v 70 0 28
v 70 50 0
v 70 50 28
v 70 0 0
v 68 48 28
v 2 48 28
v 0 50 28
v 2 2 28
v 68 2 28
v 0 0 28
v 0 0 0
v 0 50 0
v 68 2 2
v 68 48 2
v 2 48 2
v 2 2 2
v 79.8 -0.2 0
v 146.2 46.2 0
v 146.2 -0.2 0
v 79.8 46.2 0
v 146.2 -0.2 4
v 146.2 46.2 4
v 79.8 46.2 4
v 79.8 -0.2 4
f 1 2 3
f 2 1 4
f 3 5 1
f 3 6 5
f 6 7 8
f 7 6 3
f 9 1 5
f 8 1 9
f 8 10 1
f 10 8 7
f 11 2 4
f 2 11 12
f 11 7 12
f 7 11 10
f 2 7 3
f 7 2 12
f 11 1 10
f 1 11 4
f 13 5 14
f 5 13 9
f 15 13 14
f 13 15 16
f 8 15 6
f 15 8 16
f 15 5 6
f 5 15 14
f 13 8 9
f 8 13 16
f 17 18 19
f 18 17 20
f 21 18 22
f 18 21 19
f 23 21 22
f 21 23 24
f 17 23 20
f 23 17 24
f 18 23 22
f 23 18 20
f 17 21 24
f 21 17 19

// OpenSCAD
// Two-part enclosure for a small electronics board (e.g. Arduino-based temperature logger)
// Print orientation: box stands on its floor, lid is printed upside down on the +X side

// ---------------- Parameters ----------------
box_x      = 70;    // box outer length (X)
box_y      = 50;    // box outer width (Y)
box_z      = 30;    // box outer height (Z)
wall       = 2;     // box wall thickness
floor      = 2;     // box floor thickness (separate from walls for clarity)

lip_t      = 1.5;   // lid wall thickness
lip_h      = 4;     // lid wall height (extends above the 2 mm plate)
lip_x      = 65.6;  // lid outer length (X)
lip_y      = 45.6;  // lid outer width (Y)
clearance  = 0.2;   // clearance between lip outer size and box opening

plate_t    = 2;     // lid plate thickness resting on the bed
gap        = 10;    // gap between box and lid on the bed

eps        = 0.5;   // cutter overshoot past faces

$fn = 64;

// ---------------- Derived ----------------
opening_x = box_x - 2 * wall;   // 66
opening_y = box_y - 2 * wall;   // 46
// lip_x / lip_y are each 4 * clearance smaller than the opening, so the lip slides in with 0.2 mm clearance per side

// ---------------- Model ----------------
union() {
    // Part 1: box (open top)
    difference() {
        cube([box_x, box_y, box_z - floor]);   // outer shell above the floor
        translate([wall, wall, floor])
            cube([opening_x, opening_y, box_z - floor + eps]);  // open the top face
    }

    // Part 2: lid, printed upside down, on the +X side of the box
    translate([box_x + gap, 0, 0])
        union() {
            // base plate lying on the bed
            cube([lip_x, lip_y, plate_t]);

            // rectangular lip on top of the plate, centred on it
            translate([(lip_x - opening_x) / 2, (lip_y - opening_y) / 2, 0])
                cube([opening_x + clearance * 2, opening_y + clearance * 2, lip_h]);
        }
}
